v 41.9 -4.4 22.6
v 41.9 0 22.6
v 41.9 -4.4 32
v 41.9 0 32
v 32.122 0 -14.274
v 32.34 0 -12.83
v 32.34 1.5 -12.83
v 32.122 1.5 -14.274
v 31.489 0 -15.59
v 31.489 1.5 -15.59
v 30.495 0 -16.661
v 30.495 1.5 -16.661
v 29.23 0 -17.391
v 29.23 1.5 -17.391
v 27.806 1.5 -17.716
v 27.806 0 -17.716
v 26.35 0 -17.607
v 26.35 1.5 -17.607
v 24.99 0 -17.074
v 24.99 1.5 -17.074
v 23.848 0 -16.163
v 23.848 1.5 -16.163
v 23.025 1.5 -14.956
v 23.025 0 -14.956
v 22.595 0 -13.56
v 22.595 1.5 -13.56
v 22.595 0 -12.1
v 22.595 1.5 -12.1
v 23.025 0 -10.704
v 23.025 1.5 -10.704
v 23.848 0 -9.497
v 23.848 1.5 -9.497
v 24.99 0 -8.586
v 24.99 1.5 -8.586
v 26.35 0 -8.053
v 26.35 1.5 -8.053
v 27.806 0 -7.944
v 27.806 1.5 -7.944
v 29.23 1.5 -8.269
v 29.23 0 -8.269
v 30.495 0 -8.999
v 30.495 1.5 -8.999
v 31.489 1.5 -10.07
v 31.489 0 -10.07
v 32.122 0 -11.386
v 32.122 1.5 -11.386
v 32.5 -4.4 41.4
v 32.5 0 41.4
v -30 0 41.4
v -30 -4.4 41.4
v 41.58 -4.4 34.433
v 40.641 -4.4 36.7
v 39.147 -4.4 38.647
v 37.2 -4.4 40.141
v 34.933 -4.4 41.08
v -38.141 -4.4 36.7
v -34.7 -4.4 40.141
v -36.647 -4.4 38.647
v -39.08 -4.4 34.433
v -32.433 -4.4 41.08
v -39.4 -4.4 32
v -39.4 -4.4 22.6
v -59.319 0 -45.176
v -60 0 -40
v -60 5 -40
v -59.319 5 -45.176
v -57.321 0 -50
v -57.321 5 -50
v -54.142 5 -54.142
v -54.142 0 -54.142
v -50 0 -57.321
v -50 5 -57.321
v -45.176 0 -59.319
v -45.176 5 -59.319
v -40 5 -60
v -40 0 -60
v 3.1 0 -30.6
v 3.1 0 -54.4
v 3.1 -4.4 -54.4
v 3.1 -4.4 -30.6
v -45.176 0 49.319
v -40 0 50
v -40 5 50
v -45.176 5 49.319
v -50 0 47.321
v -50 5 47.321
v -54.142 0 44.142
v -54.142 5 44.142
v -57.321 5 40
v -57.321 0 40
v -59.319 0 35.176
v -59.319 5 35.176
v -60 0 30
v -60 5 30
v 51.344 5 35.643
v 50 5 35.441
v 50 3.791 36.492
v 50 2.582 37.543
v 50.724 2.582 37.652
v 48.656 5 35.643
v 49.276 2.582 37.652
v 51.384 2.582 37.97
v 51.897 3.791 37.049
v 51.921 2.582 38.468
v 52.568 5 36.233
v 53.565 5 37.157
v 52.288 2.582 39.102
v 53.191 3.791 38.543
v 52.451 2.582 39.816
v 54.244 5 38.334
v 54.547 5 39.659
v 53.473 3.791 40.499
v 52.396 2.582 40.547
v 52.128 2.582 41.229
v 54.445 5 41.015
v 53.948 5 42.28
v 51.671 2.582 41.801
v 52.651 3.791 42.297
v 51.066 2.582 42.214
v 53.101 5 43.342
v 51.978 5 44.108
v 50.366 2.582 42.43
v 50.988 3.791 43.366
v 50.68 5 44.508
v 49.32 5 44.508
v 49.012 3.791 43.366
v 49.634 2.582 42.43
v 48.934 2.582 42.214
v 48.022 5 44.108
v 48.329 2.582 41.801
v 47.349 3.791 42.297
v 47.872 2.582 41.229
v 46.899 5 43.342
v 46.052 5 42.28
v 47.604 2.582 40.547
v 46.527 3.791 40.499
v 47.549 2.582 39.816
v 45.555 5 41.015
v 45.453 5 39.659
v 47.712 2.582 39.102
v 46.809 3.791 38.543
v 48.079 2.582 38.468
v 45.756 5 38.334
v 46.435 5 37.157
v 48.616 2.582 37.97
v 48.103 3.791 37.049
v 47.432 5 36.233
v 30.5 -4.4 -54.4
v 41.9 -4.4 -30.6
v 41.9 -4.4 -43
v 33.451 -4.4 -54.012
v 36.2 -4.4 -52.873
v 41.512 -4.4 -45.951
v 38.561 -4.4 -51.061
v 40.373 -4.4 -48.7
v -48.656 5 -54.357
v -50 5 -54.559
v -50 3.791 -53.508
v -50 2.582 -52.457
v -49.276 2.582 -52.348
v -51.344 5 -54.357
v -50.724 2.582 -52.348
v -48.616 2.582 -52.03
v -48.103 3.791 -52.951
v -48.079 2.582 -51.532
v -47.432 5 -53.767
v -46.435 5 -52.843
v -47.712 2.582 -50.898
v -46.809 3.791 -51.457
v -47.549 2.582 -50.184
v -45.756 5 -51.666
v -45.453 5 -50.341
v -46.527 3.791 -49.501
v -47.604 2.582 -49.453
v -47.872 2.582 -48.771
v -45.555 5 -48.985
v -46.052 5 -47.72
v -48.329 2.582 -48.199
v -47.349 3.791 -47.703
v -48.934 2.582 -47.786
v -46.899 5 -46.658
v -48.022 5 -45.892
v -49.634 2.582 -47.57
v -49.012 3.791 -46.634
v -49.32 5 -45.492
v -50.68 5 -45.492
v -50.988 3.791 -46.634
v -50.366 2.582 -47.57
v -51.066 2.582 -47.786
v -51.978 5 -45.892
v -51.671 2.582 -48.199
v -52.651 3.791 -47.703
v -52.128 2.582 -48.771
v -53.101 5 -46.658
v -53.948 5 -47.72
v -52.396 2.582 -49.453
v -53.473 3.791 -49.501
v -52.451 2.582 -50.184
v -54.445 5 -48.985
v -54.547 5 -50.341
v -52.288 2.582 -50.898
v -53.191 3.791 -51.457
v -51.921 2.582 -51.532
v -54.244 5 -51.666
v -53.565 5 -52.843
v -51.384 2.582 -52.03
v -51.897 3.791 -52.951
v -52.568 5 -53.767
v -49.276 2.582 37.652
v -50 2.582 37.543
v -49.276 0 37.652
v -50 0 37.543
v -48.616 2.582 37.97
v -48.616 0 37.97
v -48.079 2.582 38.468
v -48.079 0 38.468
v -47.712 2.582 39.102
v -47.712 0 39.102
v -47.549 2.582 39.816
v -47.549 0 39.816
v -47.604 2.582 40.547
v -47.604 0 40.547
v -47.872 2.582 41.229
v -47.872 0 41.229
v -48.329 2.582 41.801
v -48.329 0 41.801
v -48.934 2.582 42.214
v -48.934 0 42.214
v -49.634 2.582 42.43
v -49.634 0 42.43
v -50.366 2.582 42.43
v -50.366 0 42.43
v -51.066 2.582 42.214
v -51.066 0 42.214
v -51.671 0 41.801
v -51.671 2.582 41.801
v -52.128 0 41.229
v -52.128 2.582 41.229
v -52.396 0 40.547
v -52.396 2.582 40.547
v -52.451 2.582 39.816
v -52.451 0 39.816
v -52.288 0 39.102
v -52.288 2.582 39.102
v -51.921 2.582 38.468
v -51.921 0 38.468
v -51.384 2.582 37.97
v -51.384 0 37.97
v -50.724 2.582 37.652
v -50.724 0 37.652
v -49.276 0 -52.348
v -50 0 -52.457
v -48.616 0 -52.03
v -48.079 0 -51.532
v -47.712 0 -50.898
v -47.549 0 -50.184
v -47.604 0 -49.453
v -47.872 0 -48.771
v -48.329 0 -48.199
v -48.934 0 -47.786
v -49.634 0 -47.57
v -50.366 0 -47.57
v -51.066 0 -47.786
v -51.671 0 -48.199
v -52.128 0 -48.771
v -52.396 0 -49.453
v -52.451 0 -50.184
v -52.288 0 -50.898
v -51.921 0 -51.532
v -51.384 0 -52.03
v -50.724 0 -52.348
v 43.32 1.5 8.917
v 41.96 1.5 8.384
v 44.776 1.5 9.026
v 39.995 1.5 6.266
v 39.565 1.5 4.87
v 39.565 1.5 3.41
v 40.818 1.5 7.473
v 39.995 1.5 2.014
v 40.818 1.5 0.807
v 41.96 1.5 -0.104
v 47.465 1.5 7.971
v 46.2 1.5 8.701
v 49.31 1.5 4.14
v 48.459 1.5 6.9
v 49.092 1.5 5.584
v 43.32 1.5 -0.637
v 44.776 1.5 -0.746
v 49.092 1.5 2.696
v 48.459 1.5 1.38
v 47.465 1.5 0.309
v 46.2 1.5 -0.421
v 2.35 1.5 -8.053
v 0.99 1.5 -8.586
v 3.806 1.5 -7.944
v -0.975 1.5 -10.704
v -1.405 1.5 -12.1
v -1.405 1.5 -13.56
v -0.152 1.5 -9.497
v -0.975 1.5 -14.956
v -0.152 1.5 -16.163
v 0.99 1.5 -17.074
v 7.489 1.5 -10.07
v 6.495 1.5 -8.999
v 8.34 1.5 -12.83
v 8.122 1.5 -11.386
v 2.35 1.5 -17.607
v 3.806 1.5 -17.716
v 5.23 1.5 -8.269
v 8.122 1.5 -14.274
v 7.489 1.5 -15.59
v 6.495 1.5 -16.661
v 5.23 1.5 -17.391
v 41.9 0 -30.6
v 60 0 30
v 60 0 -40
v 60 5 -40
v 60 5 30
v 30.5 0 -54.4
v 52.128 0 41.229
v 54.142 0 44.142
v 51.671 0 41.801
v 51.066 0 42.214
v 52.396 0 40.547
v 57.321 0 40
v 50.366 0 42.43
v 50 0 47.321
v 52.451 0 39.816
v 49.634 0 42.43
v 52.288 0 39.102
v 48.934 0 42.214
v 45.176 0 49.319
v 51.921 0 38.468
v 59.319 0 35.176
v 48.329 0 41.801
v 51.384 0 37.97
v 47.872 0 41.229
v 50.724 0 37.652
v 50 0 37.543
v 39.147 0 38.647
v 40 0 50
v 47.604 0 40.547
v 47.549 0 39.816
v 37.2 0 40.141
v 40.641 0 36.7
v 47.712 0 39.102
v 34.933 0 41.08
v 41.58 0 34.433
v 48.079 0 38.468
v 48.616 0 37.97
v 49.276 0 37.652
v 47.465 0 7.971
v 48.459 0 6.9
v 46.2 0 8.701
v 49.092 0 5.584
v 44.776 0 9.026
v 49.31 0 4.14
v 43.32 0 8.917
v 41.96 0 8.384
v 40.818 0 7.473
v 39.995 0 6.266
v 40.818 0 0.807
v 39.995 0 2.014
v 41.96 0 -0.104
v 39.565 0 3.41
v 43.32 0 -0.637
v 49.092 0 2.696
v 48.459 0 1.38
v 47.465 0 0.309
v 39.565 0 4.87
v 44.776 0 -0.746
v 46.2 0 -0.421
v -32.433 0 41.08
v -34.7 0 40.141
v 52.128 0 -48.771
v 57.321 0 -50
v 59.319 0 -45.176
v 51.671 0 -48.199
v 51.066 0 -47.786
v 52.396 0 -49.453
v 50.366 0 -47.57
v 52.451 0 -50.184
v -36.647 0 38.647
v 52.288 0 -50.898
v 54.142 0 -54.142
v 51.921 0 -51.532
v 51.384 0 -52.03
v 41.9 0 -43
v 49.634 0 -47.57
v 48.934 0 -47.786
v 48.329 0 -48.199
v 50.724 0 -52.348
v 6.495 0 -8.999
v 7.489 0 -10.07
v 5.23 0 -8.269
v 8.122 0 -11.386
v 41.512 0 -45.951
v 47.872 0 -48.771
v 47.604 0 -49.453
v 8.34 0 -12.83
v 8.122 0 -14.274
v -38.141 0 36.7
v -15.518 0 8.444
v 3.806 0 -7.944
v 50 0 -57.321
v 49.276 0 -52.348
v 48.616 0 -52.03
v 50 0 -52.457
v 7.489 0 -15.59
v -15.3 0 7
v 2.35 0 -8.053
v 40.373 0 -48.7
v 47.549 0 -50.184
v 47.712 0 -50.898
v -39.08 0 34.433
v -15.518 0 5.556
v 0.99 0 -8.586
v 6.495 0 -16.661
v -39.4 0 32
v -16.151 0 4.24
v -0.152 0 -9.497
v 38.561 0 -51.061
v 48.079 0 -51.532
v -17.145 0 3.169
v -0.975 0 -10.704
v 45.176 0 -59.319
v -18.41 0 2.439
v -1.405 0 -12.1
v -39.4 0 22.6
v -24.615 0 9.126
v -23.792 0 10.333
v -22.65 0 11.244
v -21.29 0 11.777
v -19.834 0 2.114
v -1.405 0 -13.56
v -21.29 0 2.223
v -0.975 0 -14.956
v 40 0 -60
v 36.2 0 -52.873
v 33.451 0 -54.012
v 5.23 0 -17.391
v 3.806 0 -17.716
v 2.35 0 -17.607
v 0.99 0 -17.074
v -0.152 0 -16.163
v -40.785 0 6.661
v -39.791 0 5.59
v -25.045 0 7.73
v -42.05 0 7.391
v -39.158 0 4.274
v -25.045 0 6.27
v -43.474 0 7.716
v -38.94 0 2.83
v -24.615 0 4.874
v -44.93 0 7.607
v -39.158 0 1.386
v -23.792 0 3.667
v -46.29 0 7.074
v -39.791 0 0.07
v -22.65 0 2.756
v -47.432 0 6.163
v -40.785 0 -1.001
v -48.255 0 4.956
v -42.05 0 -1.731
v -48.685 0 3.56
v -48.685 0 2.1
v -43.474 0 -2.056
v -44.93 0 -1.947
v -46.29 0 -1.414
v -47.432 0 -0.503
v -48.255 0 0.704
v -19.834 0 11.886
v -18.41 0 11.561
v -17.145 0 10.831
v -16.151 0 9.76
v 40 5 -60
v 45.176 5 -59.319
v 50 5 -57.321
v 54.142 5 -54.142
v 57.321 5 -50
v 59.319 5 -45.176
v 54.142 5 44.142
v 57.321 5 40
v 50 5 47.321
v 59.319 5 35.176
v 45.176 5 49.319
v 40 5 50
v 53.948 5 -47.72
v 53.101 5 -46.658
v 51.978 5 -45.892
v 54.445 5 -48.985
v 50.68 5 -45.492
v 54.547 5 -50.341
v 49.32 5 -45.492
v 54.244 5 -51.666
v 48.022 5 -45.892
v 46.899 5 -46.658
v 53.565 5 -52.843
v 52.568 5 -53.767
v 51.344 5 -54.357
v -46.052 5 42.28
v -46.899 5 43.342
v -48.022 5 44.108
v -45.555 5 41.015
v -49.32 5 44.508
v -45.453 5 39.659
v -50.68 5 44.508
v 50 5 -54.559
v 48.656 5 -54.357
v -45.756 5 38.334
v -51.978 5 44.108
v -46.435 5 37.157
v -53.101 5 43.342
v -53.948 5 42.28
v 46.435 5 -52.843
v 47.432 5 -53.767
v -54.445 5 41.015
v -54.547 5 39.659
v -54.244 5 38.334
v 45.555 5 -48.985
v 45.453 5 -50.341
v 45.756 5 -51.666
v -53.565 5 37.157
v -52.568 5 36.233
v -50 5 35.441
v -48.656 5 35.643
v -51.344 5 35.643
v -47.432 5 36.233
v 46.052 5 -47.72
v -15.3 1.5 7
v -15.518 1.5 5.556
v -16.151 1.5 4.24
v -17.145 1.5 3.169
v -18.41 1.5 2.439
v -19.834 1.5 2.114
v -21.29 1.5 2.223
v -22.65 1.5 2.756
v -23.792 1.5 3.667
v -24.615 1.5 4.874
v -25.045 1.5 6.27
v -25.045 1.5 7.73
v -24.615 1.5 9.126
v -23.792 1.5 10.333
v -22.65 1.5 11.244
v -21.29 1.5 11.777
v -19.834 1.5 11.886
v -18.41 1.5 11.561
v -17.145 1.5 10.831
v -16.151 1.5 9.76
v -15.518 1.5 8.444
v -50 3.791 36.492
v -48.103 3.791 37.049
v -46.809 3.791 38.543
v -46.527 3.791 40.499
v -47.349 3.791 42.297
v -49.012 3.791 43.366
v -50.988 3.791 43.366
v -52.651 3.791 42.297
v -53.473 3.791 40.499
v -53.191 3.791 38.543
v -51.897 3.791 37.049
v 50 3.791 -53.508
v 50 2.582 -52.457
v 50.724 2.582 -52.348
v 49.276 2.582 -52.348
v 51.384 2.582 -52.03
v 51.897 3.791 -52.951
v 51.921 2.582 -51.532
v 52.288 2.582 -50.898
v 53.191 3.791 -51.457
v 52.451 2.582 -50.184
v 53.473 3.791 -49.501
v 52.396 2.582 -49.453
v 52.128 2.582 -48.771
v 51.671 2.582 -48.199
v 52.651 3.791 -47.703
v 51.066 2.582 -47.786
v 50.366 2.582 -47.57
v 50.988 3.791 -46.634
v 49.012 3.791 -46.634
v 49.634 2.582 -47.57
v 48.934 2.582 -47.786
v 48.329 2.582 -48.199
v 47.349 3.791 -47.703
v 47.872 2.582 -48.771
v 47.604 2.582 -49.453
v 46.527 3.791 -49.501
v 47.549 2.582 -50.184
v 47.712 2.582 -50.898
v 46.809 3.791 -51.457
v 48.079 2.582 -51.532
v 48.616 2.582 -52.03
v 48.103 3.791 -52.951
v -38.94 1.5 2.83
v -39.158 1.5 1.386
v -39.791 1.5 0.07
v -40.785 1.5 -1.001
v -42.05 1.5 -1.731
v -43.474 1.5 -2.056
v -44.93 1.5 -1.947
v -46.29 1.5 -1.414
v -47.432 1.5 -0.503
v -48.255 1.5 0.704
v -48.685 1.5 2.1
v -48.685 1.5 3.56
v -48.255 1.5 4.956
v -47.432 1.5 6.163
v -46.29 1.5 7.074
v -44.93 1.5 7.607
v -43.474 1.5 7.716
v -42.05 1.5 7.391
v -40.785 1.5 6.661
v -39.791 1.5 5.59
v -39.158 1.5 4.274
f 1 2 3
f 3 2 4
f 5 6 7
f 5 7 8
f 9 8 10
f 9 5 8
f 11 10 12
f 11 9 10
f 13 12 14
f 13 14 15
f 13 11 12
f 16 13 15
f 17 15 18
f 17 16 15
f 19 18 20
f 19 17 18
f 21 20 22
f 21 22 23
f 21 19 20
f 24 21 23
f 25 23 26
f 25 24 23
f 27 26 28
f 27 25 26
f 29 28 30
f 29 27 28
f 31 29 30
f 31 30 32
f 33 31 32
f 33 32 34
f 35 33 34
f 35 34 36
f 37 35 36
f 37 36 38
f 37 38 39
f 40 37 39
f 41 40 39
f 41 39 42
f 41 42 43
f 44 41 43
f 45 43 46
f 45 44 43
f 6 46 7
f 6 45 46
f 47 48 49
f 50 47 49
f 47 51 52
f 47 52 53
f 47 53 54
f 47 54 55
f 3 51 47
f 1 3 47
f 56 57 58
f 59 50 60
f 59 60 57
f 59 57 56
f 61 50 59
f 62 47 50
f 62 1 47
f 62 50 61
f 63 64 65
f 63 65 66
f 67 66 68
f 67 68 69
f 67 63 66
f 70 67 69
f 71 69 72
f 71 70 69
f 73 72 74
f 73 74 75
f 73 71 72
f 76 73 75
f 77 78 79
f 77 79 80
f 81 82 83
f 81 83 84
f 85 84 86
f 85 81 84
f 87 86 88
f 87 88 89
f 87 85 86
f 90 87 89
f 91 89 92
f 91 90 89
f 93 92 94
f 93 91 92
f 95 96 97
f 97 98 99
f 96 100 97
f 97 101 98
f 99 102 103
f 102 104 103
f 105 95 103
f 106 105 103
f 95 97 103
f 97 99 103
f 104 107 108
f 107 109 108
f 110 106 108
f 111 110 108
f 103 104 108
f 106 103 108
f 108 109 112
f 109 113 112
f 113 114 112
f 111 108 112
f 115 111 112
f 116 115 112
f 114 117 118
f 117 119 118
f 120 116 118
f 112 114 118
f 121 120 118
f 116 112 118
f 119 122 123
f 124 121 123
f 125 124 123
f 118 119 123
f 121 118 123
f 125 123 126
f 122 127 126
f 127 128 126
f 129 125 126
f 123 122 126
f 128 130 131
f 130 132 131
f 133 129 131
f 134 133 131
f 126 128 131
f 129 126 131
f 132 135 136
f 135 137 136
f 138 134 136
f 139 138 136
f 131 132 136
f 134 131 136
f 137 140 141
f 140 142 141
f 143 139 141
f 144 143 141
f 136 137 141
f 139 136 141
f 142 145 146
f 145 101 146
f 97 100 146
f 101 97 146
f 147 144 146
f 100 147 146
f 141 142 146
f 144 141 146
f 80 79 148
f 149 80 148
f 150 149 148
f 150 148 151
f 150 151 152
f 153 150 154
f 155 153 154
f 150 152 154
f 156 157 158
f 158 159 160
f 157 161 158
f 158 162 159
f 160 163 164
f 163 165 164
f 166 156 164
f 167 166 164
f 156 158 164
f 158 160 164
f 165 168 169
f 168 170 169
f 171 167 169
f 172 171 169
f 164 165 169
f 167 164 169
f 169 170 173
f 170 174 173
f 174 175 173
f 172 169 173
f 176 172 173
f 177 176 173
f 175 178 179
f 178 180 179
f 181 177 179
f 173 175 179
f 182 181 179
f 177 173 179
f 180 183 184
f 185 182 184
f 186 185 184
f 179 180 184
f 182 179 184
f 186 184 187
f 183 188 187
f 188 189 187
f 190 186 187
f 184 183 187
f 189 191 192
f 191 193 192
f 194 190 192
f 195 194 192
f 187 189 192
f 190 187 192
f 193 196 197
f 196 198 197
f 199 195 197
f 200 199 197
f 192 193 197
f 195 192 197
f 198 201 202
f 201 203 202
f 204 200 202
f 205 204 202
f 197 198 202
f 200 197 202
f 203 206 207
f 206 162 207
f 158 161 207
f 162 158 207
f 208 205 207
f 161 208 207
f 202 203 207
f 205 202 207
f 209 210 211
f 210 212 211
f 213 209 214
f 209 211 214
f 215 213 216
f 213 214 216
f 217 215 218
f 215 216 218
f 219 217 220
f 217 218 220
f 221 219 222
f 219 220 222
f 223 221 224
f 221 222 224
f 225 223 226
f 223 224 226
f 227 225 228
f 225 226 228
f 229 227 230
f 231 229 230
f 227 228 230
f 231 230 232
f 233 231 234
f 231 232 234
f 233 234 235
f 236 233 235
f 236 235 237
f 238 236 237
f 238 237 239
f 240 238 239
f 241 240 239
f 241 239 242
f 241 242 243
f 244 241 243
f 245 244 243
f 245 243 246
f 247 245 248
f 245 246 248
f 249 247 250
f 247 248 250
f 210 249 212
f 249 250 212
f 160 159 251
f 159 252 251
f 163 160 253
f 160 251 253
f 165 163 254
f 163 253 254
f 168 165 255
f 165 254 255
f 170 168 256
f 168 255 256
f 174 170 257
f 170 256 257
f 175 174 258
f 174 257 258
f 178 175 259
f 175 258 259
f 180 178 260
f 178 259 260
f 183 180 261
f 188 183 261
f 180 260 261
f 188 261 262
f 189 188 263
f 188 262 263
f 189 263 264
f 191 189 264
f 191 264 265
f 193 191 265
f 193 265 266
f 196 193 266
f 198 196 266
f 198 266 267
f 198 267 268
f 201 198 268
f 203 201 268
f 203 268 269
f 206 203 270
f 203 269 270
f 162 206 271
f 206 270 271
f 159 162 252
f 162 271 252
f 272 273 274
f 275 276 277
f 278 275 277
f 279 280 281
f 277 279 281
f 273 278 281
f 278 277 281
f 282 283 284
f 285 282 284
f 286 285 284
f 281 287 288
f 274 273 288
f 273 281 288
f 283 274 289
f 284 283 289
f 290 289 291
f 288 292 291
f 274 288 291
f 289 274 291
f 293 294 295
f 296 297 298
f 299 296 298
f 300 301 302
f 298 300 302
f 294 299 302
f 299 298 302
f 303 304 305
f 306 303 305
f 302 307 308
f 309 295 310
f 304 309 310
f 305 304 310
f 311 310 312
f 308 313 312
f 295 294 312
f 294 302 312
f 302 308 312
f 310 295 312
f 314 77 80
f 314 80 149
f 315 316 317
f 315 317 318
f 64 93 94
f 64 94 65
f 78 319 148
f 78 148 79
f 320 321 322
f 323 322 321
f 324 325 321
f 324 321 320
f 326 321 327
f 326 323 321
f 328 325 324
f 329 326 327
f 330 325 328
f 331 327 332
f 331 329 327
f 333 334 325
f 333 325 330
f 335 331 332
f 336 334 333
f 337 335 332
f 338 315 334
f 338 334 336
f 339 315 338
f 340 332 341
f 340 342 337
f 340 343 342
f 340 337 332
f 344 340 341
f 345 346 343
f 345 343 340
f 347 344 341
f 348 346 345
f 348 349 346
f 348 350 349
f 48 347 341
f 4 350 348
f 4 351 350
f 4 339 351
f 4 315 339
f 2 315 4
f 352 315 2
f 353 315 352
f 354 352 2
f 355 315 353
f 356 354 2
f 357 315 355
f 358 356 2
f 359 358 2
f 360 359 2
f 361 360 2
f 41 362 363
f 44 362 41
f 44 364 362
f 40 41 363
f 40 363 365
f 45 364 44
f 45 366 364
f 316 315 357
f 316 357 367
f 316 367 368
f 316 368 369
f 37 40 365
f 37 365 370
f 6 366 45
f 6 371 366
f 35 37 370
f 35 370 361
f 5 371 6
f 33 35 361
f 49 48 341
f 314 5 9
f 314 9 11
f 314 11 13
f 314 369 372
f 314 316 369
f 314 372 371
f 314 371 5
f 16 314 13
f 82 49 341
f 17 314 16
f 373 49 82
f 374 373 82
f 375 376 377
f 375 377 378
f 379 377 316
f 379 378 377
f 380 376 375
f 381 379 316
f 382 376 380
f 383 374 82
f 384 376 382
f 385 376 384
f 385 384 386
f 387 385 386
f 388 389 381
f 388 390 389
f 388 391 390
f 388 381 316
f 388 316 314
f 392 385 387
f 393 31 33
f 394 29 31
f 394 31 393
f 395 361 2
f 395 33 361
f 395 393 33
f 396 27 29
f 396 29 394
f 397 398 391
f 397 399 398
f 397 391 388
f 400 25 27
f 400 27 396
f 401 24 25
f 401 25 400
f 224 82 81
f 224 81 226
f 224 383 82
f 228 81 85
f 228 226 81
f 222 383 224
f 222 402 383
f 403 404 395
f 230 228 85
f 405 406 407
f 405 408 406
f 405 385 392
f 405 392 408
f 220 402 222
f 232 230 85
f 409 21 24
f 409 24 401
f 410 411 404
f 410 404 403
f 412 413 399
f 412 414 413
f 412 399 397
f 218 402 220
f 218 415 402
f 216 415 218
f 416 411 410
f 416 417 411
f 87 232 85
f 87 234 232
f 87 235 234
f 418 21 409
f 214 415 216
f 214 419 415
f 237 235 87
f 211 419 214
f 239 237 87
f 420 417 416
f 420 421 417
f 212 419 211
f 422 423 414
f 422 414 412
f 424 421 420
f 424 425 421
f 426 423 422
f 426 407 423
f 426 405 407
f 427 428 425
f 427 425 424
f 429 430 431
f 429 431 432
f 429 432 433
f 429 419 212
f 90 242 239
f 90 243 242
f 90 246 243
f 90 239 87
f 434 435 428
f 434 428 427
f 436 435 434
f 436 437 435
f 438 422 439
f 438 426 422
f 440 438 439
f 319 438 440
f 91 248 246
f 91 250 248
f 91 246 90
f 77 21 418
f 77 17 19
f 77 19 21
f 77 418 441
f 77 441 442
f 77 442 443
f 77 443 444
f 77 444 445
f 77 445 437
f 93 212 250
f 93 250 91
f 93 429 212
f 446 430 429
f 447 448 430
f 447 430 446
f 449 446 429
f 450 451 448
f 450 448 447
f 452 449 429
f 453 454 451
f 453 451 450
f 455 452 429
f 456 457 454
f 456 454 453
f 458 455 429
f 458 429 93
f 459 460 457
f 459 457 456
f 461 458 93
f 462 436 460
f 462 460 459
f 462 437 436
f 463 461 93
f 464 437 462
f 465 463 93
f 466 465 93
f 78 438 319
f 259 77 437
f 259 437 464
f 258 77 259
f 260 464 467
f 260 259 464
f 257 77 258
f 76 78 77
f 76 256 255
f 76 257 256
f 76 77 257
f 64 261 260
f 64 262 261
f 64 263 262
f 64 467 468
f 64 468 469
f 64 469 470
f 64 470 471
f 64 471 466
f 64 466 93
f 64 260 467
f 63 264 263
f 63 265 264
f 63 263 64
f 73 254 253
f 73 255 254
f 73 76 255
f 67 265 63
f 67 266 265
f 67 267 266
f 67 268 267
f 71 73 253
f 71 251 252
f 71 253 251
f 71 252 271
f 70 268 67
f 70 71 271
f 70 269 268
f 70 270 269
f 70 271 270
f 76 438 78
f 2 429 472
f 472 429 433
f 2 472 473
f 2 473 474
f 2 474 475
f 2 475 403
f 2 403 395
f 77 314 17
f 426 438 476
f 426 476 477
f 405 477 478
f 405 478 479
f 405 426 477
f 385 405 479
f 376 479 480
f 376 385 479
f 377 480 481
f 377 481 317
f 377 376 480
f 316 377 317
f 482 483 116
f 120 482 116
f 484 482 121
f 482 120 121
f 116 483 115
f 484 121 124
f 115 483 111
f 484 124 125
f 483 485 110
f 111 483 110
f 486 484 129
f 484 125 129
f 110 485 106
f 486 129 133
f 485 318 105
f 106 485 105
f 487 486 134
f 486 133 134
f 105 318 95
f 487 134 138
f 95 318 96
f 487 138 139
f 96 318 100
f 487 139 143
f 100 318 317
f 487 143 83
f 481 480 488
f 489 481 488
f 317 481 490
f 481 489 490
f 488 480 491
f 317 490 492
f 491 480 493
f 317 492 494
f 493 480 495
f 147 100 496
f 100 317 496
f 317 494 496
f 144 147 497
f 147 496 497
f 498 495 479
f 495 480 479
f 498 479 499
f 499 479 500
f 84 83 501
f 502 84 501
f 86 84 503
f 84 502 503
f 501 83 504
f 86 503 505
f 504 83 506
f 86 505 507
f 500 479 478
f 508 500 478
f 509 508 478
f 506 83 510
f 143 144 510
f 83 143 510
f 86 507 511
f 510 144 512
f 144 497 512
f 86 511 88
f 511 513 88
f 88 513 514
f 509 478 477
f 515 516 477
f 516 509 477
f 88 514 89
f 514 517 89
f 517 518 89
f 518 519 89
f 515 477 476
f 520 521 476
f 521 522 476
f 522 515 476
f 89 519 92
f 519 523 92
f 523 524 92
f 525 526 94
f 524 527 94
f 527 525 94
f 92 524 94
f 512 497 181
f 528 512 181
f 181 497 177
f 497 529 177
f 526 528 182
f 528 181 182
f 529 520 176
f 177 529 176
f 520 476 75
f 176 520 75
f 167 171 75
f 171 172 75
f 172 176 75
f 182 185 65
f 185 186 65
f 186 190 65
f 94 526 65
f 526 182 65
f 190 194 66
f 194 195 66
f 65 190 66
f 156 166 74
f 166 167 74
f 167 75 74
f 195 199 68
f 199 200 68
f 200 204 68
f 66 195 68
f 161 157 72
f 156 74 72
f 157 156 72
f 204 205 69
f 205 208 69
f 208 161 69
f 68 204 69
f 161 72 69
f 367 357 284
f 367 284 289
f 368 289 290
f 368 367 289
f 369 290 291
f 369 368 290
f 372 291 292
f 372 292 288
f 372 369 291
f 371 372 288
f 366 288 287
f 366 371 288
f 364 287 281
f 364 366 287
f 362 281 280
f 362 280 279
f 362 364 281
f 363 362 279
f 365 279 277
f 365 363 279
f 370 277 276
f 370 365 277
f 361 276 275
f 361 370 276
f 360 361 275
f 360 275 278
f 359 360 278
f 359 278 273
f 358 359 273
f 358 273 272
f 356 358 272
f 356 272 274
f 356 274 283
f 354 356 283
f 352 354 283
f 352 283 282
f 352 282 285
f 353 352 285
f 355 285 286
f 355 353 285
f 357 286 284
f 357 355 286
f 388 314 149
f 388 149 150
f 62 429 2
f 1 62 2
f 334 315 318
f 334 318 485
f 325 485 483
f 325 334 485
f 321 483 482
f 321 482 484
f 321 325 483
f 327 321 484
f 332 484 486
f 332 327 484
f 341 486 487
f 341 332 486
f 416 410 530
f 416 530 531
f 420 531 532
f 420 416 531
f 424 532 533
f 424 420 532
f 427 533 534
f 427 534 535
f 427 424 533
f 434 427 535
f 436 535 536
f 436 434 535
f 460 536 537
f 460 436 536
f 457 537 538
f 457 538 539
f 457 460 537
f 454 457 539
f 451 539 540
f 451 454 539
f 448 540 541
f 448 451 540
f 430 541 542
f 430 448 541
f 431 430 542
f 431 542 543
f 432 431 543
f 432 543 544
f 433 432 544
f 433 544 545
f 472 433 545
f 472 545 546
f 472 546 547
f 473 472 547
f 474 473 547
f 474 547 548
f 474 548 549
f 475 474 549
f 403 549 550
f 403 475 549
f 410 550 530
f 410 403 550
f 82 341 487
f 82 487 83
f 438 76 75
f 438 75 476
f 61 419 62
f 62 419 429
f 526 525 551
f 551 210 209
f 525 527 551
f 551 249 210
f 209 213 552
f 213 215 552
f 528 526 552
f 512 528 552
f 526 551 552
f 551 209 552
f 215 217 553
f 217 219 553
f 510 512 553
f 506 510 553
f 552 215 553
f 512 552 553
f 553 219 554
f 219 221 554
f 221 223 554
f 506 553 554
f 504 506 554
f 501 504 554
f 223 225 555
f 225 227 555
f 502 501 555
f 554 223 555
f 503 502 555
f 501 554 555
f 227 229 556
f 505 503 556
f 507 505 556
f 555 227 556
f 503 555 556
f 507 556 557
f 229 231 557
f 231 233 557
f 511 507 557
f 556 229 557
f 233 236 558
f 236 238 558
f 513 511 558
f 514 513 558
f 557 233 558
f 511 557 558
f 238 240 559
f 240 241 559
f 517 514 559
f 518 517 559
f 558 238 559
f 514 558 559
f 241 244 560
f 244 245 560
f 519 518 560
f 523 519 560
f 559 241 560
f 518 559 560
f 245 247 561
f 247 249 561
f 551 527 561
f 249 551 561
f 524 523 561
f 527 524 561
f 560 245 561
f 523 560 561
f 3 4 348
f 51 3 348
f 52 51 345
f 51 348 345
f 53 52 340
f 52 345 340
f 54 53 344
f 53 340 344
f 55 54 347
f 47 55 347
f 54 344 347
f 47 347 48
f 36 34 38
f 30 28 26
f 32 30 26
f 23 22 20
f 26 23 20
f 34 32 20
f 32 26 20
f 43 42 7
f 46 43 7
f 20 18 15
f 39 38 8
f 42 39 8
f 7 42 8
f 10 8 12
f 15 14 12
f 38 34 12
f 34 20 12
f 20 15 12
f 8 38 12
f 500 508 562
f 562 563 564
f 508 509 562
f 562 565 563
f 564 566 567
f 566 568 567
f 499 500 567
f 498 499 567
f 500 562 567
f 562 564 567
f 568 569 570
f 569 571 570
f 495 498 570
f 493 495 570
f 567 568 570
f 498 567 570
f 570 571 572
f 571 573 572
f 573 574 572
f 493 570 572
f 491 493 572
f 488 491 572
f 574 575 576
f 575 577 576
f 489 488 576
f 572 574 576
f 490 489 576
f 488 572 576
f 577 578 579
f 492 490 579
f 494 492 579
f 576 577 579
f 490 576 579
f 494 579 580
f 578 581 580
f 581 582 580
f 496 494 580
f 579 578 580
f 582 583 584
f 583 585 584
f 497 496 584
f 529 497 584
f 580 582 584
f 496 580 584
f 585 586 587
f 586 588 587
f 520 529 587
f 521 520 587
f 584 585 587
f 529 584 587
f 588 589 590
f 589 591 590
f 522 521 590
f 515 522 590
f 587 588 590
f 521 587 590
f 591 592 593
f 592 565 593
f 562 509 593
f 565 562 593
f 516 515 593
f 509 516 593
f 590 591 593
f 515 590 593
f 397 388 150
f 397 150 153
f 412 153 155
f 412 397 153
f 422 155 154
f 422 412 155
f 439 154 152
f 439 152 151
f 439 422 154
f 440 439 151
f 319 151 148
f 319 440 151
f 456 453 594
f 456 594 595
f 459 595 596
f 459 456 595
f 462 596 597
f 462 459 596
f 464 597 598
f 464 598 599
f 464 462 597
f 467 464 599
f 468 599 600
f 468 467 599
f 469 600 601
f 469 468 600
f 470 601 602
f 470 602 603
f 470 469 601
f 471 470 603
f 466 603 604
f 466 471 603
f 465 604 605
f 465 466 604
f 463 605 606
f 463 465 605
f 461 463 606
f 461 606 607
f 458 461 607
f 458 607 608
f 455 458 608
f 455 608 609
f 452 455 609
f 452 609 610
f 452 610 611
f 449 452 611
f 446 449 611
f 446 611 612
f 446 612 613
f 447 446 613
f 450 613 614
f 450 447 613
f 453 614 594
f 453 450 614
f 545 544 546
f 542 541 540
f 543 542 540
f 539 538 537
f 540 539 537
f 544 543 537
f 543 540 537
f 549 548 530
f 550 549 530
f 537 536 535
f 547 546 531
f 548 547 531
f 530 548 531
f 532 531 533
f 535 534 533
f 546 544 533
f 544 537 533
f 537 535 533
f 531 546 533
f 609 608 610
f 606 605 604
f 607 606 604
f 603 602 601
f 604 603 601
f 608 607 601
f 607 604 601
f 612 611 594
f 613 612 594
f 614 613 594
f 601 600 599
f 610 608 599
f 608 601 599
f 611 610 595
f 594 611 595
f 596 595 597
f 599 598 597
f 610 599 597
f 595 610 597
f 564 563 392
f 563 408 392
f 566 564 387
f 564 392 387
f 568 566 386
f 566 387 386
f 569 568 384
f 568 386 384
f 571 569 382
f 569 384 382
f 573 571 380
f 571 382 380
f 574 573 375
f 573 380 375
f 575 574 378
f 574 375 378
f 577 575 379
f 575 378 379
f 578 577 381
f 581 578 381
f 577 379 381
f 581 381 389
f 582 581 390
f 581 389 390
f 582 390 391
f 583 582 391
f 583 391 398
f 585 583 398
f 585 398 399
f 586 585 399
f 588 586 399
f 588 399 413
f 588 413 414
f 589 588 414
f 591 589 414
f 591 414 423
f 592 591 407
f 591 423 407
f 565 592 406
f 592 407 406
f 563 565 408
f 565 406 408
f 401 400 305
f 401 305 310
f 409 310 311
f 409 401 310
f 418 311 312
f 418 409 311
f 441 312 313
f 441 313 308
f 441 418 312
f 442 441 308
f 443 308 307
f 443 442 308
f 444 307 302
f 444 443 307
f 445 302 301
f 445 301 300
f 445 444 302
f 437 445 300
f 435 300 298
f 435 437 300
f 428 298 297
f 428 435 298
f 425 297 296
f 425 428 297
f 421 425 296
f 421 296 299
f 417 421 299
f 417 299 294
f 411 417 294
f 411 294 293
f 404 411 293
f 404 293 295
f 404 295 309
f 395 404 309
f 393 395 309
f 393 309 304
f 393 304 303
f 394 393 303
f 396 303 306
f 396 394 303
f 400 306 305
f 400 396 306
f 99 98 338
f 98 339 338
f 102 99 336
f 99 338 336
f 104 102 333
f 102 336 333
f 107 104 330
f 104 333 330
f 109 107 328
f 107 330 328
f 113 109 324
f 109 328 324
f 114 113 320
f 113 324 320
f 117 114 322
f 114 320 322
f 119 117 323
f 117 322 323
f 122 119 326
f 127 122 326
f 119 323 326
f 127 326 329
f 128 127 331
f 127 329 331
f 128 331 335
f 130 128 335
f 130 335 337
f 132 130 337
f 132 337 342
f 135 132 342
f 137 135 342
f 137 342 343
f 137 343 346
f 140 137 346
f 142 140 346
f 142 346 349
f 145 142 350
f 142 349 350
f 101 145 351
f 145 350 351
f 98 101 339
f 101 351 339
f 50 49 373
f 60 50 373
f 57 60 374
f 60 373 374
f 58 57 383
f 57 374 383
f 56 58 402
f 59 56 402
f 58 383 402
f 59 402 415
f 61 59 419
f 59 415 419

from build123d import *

# Parameters (mm, degrees)
BOSS_EXTRUDE1_DEPTH                               = 5
BOSS_EXTRUDE2_DEPTH                               = 4.4
CUT_EXTRUDE2_START                                = -5
SKETCH4_R                                         = 4.9
CUT_EXTRUDE2_DEPTH                                = 1.5
CSK_FOR_8_FLAT_HEAD_SOCKET_CAP_SCREW1_D           = 4.9149
CSK_FOR_8_FLAT_HEAD_SOCKET_CAP_SCREW1_DEPTH       = 68.34
CSK_FOR_8_FLAT_HEAD_SOCKET_CAP_SCREW1_CSINK_D     = 9.1186
CSK_FOR_8_FLAT_HEAD_SOCKET_CAP_SCREW1_CSINK_ANGLE = 82
CSK_FOR_8_FLAT_HEAD_SOCKET_CAP_SCREW1_TIP         = 1.476584928


with BuildPart() as part:
    # Sketch1 → Boss-Extrude1 (new body)
    with BuildSketch(Plane(origin=(0, 0, 0), x_dir=(1, 0, 0), z_dir=(0, 1, 0))):
        with BuildLine():
            Line((-60, -30), (-60, 40))
            ThreePointArc((-60, 40), (-54.142135624, 54.142135624), (-40, 60))
            Line((-40, 60), (40, 60))
            ThreePointArc((40, 60), (54.142135624, 54.142135624), (60, 40))
            Line((60, 40), (60, -30))
            ThreePointArc((60, -30), (54.142135624, -44.142135624), (40, -50))
            Line((40, -50), (-40, -50))
            ThreePointArc((-40, -50), (-54.142135624, -44.142135624), (-60, -30))
        make_face()
    extrude(amount=BOSS_EXTRUDE1_DEPTH)

    # Sketch1<5> → Boss-Extrude2 (add)
    with BuildSketch(Plane(origin=(0, 0, 0), x_dir=(1, 0, 0), z_dir=(0, 1, 0))):
        with BuildLine():
            Line((-39.4, -22.6), (41.9, -22.6))
            Line((41.9, -22.6), (41.9, -32))
            ThreePointArc((41.9, -32), (39.146803743, -38.646803743), (32.5, -41.4))
            Line((32.5, -41.4), (-30, -41.4))
            ThreePointArc((-30, -41.4), (-36.646803743, -38.646803743), (-39.4, -32))
            Line((-39.4, -32), (-39.4, -22.6))
        make_face()
        with BuildLine():
            Line((3.1, 54.4), (3.1, 30.6))
            Line((3.1, 30.6), (41.9, 30.6))
            Line((41.9, 30.6), (41.9, 43))
            ThreePointArc((41.9, 43), (38.561017306, 51.061017306), (30.5, 54.4))
            Line((30.5, 54.4), (3.1, 54.4))
        make_face()
    extrude(amount=-BOSS_EXTRUDE2_DEPTH)

    # Sketch4 → Cut-Extrude2 (cut)
    with BuildSketch(Plane(origin=(0, 5, 0), x_dir=(1, 0, 0), z_dir=(0, 1, 0)).offset(CUT_EXTRUDE2_START)):
        with Locations((-20.2, -7)):
            Circle(SKETCH4_R)
        with Locations((-43.84, -2.83)):
            Circle(SKETCH4_R)
        with Locations((3.44, 12.83)):
            Circle(SKETCH4_R)
        with Locations((44.41, -4.14)):
            Circle(SKETCH4_R)
        with Locations((27.44, 12.83)):
            Circle(SKETCH4_R)
    extrude(amount=CUT_EXTRUDE2_DEPTH, mode=Mode.SUBTRACT)

    # CSK for #8 Flat Head Socket Cap Screw1
    with Locations(Plane(origin=(50, 5, 40), x_dir=(0, 0, 1), z_dir=(0, 1, 0))):
        with Locations((0, 0), (-90, 0), (-90, -100), (0, -100)):
            CounterSinkHole(CSK_FOR_8_FLAT_HEAD_SOCKET_CAP_SCREW1_D / 2, CSK_FOR_8_FLAT_HEAD_SOCKET_CAP_SCREW1_CSINK_D / 2, depth=CSK_FOR_8_FLAT_HEAD_SOCKET_CAP_SCREW1_DEPTH, counter_sink_angle=CSK_FOR_8_FLAT_HEAD_SOCKET_CAP_SCREW1_CSINK_ANGLE)
            with Locations((0, 0, -(CSK_FOR_8_FLAT_HEAD_SOCKET_CAP_SCREW1_DEPTH + CSK_FOR_8_FLAT_HEAD_SOCKET_CAP_SCREW1_TIP / 2))):  # 118° drill point
                Cone(0, CSK_FOR_8_FLAT_HEAD_SOCKET_CAP_SCREW1_D / 2, CSK_FOR_8_FLAT_HEAD_SOCKET_CAP_SCREW1_TIP, mode=Mode.SUBTRACT)


solid = part.part
